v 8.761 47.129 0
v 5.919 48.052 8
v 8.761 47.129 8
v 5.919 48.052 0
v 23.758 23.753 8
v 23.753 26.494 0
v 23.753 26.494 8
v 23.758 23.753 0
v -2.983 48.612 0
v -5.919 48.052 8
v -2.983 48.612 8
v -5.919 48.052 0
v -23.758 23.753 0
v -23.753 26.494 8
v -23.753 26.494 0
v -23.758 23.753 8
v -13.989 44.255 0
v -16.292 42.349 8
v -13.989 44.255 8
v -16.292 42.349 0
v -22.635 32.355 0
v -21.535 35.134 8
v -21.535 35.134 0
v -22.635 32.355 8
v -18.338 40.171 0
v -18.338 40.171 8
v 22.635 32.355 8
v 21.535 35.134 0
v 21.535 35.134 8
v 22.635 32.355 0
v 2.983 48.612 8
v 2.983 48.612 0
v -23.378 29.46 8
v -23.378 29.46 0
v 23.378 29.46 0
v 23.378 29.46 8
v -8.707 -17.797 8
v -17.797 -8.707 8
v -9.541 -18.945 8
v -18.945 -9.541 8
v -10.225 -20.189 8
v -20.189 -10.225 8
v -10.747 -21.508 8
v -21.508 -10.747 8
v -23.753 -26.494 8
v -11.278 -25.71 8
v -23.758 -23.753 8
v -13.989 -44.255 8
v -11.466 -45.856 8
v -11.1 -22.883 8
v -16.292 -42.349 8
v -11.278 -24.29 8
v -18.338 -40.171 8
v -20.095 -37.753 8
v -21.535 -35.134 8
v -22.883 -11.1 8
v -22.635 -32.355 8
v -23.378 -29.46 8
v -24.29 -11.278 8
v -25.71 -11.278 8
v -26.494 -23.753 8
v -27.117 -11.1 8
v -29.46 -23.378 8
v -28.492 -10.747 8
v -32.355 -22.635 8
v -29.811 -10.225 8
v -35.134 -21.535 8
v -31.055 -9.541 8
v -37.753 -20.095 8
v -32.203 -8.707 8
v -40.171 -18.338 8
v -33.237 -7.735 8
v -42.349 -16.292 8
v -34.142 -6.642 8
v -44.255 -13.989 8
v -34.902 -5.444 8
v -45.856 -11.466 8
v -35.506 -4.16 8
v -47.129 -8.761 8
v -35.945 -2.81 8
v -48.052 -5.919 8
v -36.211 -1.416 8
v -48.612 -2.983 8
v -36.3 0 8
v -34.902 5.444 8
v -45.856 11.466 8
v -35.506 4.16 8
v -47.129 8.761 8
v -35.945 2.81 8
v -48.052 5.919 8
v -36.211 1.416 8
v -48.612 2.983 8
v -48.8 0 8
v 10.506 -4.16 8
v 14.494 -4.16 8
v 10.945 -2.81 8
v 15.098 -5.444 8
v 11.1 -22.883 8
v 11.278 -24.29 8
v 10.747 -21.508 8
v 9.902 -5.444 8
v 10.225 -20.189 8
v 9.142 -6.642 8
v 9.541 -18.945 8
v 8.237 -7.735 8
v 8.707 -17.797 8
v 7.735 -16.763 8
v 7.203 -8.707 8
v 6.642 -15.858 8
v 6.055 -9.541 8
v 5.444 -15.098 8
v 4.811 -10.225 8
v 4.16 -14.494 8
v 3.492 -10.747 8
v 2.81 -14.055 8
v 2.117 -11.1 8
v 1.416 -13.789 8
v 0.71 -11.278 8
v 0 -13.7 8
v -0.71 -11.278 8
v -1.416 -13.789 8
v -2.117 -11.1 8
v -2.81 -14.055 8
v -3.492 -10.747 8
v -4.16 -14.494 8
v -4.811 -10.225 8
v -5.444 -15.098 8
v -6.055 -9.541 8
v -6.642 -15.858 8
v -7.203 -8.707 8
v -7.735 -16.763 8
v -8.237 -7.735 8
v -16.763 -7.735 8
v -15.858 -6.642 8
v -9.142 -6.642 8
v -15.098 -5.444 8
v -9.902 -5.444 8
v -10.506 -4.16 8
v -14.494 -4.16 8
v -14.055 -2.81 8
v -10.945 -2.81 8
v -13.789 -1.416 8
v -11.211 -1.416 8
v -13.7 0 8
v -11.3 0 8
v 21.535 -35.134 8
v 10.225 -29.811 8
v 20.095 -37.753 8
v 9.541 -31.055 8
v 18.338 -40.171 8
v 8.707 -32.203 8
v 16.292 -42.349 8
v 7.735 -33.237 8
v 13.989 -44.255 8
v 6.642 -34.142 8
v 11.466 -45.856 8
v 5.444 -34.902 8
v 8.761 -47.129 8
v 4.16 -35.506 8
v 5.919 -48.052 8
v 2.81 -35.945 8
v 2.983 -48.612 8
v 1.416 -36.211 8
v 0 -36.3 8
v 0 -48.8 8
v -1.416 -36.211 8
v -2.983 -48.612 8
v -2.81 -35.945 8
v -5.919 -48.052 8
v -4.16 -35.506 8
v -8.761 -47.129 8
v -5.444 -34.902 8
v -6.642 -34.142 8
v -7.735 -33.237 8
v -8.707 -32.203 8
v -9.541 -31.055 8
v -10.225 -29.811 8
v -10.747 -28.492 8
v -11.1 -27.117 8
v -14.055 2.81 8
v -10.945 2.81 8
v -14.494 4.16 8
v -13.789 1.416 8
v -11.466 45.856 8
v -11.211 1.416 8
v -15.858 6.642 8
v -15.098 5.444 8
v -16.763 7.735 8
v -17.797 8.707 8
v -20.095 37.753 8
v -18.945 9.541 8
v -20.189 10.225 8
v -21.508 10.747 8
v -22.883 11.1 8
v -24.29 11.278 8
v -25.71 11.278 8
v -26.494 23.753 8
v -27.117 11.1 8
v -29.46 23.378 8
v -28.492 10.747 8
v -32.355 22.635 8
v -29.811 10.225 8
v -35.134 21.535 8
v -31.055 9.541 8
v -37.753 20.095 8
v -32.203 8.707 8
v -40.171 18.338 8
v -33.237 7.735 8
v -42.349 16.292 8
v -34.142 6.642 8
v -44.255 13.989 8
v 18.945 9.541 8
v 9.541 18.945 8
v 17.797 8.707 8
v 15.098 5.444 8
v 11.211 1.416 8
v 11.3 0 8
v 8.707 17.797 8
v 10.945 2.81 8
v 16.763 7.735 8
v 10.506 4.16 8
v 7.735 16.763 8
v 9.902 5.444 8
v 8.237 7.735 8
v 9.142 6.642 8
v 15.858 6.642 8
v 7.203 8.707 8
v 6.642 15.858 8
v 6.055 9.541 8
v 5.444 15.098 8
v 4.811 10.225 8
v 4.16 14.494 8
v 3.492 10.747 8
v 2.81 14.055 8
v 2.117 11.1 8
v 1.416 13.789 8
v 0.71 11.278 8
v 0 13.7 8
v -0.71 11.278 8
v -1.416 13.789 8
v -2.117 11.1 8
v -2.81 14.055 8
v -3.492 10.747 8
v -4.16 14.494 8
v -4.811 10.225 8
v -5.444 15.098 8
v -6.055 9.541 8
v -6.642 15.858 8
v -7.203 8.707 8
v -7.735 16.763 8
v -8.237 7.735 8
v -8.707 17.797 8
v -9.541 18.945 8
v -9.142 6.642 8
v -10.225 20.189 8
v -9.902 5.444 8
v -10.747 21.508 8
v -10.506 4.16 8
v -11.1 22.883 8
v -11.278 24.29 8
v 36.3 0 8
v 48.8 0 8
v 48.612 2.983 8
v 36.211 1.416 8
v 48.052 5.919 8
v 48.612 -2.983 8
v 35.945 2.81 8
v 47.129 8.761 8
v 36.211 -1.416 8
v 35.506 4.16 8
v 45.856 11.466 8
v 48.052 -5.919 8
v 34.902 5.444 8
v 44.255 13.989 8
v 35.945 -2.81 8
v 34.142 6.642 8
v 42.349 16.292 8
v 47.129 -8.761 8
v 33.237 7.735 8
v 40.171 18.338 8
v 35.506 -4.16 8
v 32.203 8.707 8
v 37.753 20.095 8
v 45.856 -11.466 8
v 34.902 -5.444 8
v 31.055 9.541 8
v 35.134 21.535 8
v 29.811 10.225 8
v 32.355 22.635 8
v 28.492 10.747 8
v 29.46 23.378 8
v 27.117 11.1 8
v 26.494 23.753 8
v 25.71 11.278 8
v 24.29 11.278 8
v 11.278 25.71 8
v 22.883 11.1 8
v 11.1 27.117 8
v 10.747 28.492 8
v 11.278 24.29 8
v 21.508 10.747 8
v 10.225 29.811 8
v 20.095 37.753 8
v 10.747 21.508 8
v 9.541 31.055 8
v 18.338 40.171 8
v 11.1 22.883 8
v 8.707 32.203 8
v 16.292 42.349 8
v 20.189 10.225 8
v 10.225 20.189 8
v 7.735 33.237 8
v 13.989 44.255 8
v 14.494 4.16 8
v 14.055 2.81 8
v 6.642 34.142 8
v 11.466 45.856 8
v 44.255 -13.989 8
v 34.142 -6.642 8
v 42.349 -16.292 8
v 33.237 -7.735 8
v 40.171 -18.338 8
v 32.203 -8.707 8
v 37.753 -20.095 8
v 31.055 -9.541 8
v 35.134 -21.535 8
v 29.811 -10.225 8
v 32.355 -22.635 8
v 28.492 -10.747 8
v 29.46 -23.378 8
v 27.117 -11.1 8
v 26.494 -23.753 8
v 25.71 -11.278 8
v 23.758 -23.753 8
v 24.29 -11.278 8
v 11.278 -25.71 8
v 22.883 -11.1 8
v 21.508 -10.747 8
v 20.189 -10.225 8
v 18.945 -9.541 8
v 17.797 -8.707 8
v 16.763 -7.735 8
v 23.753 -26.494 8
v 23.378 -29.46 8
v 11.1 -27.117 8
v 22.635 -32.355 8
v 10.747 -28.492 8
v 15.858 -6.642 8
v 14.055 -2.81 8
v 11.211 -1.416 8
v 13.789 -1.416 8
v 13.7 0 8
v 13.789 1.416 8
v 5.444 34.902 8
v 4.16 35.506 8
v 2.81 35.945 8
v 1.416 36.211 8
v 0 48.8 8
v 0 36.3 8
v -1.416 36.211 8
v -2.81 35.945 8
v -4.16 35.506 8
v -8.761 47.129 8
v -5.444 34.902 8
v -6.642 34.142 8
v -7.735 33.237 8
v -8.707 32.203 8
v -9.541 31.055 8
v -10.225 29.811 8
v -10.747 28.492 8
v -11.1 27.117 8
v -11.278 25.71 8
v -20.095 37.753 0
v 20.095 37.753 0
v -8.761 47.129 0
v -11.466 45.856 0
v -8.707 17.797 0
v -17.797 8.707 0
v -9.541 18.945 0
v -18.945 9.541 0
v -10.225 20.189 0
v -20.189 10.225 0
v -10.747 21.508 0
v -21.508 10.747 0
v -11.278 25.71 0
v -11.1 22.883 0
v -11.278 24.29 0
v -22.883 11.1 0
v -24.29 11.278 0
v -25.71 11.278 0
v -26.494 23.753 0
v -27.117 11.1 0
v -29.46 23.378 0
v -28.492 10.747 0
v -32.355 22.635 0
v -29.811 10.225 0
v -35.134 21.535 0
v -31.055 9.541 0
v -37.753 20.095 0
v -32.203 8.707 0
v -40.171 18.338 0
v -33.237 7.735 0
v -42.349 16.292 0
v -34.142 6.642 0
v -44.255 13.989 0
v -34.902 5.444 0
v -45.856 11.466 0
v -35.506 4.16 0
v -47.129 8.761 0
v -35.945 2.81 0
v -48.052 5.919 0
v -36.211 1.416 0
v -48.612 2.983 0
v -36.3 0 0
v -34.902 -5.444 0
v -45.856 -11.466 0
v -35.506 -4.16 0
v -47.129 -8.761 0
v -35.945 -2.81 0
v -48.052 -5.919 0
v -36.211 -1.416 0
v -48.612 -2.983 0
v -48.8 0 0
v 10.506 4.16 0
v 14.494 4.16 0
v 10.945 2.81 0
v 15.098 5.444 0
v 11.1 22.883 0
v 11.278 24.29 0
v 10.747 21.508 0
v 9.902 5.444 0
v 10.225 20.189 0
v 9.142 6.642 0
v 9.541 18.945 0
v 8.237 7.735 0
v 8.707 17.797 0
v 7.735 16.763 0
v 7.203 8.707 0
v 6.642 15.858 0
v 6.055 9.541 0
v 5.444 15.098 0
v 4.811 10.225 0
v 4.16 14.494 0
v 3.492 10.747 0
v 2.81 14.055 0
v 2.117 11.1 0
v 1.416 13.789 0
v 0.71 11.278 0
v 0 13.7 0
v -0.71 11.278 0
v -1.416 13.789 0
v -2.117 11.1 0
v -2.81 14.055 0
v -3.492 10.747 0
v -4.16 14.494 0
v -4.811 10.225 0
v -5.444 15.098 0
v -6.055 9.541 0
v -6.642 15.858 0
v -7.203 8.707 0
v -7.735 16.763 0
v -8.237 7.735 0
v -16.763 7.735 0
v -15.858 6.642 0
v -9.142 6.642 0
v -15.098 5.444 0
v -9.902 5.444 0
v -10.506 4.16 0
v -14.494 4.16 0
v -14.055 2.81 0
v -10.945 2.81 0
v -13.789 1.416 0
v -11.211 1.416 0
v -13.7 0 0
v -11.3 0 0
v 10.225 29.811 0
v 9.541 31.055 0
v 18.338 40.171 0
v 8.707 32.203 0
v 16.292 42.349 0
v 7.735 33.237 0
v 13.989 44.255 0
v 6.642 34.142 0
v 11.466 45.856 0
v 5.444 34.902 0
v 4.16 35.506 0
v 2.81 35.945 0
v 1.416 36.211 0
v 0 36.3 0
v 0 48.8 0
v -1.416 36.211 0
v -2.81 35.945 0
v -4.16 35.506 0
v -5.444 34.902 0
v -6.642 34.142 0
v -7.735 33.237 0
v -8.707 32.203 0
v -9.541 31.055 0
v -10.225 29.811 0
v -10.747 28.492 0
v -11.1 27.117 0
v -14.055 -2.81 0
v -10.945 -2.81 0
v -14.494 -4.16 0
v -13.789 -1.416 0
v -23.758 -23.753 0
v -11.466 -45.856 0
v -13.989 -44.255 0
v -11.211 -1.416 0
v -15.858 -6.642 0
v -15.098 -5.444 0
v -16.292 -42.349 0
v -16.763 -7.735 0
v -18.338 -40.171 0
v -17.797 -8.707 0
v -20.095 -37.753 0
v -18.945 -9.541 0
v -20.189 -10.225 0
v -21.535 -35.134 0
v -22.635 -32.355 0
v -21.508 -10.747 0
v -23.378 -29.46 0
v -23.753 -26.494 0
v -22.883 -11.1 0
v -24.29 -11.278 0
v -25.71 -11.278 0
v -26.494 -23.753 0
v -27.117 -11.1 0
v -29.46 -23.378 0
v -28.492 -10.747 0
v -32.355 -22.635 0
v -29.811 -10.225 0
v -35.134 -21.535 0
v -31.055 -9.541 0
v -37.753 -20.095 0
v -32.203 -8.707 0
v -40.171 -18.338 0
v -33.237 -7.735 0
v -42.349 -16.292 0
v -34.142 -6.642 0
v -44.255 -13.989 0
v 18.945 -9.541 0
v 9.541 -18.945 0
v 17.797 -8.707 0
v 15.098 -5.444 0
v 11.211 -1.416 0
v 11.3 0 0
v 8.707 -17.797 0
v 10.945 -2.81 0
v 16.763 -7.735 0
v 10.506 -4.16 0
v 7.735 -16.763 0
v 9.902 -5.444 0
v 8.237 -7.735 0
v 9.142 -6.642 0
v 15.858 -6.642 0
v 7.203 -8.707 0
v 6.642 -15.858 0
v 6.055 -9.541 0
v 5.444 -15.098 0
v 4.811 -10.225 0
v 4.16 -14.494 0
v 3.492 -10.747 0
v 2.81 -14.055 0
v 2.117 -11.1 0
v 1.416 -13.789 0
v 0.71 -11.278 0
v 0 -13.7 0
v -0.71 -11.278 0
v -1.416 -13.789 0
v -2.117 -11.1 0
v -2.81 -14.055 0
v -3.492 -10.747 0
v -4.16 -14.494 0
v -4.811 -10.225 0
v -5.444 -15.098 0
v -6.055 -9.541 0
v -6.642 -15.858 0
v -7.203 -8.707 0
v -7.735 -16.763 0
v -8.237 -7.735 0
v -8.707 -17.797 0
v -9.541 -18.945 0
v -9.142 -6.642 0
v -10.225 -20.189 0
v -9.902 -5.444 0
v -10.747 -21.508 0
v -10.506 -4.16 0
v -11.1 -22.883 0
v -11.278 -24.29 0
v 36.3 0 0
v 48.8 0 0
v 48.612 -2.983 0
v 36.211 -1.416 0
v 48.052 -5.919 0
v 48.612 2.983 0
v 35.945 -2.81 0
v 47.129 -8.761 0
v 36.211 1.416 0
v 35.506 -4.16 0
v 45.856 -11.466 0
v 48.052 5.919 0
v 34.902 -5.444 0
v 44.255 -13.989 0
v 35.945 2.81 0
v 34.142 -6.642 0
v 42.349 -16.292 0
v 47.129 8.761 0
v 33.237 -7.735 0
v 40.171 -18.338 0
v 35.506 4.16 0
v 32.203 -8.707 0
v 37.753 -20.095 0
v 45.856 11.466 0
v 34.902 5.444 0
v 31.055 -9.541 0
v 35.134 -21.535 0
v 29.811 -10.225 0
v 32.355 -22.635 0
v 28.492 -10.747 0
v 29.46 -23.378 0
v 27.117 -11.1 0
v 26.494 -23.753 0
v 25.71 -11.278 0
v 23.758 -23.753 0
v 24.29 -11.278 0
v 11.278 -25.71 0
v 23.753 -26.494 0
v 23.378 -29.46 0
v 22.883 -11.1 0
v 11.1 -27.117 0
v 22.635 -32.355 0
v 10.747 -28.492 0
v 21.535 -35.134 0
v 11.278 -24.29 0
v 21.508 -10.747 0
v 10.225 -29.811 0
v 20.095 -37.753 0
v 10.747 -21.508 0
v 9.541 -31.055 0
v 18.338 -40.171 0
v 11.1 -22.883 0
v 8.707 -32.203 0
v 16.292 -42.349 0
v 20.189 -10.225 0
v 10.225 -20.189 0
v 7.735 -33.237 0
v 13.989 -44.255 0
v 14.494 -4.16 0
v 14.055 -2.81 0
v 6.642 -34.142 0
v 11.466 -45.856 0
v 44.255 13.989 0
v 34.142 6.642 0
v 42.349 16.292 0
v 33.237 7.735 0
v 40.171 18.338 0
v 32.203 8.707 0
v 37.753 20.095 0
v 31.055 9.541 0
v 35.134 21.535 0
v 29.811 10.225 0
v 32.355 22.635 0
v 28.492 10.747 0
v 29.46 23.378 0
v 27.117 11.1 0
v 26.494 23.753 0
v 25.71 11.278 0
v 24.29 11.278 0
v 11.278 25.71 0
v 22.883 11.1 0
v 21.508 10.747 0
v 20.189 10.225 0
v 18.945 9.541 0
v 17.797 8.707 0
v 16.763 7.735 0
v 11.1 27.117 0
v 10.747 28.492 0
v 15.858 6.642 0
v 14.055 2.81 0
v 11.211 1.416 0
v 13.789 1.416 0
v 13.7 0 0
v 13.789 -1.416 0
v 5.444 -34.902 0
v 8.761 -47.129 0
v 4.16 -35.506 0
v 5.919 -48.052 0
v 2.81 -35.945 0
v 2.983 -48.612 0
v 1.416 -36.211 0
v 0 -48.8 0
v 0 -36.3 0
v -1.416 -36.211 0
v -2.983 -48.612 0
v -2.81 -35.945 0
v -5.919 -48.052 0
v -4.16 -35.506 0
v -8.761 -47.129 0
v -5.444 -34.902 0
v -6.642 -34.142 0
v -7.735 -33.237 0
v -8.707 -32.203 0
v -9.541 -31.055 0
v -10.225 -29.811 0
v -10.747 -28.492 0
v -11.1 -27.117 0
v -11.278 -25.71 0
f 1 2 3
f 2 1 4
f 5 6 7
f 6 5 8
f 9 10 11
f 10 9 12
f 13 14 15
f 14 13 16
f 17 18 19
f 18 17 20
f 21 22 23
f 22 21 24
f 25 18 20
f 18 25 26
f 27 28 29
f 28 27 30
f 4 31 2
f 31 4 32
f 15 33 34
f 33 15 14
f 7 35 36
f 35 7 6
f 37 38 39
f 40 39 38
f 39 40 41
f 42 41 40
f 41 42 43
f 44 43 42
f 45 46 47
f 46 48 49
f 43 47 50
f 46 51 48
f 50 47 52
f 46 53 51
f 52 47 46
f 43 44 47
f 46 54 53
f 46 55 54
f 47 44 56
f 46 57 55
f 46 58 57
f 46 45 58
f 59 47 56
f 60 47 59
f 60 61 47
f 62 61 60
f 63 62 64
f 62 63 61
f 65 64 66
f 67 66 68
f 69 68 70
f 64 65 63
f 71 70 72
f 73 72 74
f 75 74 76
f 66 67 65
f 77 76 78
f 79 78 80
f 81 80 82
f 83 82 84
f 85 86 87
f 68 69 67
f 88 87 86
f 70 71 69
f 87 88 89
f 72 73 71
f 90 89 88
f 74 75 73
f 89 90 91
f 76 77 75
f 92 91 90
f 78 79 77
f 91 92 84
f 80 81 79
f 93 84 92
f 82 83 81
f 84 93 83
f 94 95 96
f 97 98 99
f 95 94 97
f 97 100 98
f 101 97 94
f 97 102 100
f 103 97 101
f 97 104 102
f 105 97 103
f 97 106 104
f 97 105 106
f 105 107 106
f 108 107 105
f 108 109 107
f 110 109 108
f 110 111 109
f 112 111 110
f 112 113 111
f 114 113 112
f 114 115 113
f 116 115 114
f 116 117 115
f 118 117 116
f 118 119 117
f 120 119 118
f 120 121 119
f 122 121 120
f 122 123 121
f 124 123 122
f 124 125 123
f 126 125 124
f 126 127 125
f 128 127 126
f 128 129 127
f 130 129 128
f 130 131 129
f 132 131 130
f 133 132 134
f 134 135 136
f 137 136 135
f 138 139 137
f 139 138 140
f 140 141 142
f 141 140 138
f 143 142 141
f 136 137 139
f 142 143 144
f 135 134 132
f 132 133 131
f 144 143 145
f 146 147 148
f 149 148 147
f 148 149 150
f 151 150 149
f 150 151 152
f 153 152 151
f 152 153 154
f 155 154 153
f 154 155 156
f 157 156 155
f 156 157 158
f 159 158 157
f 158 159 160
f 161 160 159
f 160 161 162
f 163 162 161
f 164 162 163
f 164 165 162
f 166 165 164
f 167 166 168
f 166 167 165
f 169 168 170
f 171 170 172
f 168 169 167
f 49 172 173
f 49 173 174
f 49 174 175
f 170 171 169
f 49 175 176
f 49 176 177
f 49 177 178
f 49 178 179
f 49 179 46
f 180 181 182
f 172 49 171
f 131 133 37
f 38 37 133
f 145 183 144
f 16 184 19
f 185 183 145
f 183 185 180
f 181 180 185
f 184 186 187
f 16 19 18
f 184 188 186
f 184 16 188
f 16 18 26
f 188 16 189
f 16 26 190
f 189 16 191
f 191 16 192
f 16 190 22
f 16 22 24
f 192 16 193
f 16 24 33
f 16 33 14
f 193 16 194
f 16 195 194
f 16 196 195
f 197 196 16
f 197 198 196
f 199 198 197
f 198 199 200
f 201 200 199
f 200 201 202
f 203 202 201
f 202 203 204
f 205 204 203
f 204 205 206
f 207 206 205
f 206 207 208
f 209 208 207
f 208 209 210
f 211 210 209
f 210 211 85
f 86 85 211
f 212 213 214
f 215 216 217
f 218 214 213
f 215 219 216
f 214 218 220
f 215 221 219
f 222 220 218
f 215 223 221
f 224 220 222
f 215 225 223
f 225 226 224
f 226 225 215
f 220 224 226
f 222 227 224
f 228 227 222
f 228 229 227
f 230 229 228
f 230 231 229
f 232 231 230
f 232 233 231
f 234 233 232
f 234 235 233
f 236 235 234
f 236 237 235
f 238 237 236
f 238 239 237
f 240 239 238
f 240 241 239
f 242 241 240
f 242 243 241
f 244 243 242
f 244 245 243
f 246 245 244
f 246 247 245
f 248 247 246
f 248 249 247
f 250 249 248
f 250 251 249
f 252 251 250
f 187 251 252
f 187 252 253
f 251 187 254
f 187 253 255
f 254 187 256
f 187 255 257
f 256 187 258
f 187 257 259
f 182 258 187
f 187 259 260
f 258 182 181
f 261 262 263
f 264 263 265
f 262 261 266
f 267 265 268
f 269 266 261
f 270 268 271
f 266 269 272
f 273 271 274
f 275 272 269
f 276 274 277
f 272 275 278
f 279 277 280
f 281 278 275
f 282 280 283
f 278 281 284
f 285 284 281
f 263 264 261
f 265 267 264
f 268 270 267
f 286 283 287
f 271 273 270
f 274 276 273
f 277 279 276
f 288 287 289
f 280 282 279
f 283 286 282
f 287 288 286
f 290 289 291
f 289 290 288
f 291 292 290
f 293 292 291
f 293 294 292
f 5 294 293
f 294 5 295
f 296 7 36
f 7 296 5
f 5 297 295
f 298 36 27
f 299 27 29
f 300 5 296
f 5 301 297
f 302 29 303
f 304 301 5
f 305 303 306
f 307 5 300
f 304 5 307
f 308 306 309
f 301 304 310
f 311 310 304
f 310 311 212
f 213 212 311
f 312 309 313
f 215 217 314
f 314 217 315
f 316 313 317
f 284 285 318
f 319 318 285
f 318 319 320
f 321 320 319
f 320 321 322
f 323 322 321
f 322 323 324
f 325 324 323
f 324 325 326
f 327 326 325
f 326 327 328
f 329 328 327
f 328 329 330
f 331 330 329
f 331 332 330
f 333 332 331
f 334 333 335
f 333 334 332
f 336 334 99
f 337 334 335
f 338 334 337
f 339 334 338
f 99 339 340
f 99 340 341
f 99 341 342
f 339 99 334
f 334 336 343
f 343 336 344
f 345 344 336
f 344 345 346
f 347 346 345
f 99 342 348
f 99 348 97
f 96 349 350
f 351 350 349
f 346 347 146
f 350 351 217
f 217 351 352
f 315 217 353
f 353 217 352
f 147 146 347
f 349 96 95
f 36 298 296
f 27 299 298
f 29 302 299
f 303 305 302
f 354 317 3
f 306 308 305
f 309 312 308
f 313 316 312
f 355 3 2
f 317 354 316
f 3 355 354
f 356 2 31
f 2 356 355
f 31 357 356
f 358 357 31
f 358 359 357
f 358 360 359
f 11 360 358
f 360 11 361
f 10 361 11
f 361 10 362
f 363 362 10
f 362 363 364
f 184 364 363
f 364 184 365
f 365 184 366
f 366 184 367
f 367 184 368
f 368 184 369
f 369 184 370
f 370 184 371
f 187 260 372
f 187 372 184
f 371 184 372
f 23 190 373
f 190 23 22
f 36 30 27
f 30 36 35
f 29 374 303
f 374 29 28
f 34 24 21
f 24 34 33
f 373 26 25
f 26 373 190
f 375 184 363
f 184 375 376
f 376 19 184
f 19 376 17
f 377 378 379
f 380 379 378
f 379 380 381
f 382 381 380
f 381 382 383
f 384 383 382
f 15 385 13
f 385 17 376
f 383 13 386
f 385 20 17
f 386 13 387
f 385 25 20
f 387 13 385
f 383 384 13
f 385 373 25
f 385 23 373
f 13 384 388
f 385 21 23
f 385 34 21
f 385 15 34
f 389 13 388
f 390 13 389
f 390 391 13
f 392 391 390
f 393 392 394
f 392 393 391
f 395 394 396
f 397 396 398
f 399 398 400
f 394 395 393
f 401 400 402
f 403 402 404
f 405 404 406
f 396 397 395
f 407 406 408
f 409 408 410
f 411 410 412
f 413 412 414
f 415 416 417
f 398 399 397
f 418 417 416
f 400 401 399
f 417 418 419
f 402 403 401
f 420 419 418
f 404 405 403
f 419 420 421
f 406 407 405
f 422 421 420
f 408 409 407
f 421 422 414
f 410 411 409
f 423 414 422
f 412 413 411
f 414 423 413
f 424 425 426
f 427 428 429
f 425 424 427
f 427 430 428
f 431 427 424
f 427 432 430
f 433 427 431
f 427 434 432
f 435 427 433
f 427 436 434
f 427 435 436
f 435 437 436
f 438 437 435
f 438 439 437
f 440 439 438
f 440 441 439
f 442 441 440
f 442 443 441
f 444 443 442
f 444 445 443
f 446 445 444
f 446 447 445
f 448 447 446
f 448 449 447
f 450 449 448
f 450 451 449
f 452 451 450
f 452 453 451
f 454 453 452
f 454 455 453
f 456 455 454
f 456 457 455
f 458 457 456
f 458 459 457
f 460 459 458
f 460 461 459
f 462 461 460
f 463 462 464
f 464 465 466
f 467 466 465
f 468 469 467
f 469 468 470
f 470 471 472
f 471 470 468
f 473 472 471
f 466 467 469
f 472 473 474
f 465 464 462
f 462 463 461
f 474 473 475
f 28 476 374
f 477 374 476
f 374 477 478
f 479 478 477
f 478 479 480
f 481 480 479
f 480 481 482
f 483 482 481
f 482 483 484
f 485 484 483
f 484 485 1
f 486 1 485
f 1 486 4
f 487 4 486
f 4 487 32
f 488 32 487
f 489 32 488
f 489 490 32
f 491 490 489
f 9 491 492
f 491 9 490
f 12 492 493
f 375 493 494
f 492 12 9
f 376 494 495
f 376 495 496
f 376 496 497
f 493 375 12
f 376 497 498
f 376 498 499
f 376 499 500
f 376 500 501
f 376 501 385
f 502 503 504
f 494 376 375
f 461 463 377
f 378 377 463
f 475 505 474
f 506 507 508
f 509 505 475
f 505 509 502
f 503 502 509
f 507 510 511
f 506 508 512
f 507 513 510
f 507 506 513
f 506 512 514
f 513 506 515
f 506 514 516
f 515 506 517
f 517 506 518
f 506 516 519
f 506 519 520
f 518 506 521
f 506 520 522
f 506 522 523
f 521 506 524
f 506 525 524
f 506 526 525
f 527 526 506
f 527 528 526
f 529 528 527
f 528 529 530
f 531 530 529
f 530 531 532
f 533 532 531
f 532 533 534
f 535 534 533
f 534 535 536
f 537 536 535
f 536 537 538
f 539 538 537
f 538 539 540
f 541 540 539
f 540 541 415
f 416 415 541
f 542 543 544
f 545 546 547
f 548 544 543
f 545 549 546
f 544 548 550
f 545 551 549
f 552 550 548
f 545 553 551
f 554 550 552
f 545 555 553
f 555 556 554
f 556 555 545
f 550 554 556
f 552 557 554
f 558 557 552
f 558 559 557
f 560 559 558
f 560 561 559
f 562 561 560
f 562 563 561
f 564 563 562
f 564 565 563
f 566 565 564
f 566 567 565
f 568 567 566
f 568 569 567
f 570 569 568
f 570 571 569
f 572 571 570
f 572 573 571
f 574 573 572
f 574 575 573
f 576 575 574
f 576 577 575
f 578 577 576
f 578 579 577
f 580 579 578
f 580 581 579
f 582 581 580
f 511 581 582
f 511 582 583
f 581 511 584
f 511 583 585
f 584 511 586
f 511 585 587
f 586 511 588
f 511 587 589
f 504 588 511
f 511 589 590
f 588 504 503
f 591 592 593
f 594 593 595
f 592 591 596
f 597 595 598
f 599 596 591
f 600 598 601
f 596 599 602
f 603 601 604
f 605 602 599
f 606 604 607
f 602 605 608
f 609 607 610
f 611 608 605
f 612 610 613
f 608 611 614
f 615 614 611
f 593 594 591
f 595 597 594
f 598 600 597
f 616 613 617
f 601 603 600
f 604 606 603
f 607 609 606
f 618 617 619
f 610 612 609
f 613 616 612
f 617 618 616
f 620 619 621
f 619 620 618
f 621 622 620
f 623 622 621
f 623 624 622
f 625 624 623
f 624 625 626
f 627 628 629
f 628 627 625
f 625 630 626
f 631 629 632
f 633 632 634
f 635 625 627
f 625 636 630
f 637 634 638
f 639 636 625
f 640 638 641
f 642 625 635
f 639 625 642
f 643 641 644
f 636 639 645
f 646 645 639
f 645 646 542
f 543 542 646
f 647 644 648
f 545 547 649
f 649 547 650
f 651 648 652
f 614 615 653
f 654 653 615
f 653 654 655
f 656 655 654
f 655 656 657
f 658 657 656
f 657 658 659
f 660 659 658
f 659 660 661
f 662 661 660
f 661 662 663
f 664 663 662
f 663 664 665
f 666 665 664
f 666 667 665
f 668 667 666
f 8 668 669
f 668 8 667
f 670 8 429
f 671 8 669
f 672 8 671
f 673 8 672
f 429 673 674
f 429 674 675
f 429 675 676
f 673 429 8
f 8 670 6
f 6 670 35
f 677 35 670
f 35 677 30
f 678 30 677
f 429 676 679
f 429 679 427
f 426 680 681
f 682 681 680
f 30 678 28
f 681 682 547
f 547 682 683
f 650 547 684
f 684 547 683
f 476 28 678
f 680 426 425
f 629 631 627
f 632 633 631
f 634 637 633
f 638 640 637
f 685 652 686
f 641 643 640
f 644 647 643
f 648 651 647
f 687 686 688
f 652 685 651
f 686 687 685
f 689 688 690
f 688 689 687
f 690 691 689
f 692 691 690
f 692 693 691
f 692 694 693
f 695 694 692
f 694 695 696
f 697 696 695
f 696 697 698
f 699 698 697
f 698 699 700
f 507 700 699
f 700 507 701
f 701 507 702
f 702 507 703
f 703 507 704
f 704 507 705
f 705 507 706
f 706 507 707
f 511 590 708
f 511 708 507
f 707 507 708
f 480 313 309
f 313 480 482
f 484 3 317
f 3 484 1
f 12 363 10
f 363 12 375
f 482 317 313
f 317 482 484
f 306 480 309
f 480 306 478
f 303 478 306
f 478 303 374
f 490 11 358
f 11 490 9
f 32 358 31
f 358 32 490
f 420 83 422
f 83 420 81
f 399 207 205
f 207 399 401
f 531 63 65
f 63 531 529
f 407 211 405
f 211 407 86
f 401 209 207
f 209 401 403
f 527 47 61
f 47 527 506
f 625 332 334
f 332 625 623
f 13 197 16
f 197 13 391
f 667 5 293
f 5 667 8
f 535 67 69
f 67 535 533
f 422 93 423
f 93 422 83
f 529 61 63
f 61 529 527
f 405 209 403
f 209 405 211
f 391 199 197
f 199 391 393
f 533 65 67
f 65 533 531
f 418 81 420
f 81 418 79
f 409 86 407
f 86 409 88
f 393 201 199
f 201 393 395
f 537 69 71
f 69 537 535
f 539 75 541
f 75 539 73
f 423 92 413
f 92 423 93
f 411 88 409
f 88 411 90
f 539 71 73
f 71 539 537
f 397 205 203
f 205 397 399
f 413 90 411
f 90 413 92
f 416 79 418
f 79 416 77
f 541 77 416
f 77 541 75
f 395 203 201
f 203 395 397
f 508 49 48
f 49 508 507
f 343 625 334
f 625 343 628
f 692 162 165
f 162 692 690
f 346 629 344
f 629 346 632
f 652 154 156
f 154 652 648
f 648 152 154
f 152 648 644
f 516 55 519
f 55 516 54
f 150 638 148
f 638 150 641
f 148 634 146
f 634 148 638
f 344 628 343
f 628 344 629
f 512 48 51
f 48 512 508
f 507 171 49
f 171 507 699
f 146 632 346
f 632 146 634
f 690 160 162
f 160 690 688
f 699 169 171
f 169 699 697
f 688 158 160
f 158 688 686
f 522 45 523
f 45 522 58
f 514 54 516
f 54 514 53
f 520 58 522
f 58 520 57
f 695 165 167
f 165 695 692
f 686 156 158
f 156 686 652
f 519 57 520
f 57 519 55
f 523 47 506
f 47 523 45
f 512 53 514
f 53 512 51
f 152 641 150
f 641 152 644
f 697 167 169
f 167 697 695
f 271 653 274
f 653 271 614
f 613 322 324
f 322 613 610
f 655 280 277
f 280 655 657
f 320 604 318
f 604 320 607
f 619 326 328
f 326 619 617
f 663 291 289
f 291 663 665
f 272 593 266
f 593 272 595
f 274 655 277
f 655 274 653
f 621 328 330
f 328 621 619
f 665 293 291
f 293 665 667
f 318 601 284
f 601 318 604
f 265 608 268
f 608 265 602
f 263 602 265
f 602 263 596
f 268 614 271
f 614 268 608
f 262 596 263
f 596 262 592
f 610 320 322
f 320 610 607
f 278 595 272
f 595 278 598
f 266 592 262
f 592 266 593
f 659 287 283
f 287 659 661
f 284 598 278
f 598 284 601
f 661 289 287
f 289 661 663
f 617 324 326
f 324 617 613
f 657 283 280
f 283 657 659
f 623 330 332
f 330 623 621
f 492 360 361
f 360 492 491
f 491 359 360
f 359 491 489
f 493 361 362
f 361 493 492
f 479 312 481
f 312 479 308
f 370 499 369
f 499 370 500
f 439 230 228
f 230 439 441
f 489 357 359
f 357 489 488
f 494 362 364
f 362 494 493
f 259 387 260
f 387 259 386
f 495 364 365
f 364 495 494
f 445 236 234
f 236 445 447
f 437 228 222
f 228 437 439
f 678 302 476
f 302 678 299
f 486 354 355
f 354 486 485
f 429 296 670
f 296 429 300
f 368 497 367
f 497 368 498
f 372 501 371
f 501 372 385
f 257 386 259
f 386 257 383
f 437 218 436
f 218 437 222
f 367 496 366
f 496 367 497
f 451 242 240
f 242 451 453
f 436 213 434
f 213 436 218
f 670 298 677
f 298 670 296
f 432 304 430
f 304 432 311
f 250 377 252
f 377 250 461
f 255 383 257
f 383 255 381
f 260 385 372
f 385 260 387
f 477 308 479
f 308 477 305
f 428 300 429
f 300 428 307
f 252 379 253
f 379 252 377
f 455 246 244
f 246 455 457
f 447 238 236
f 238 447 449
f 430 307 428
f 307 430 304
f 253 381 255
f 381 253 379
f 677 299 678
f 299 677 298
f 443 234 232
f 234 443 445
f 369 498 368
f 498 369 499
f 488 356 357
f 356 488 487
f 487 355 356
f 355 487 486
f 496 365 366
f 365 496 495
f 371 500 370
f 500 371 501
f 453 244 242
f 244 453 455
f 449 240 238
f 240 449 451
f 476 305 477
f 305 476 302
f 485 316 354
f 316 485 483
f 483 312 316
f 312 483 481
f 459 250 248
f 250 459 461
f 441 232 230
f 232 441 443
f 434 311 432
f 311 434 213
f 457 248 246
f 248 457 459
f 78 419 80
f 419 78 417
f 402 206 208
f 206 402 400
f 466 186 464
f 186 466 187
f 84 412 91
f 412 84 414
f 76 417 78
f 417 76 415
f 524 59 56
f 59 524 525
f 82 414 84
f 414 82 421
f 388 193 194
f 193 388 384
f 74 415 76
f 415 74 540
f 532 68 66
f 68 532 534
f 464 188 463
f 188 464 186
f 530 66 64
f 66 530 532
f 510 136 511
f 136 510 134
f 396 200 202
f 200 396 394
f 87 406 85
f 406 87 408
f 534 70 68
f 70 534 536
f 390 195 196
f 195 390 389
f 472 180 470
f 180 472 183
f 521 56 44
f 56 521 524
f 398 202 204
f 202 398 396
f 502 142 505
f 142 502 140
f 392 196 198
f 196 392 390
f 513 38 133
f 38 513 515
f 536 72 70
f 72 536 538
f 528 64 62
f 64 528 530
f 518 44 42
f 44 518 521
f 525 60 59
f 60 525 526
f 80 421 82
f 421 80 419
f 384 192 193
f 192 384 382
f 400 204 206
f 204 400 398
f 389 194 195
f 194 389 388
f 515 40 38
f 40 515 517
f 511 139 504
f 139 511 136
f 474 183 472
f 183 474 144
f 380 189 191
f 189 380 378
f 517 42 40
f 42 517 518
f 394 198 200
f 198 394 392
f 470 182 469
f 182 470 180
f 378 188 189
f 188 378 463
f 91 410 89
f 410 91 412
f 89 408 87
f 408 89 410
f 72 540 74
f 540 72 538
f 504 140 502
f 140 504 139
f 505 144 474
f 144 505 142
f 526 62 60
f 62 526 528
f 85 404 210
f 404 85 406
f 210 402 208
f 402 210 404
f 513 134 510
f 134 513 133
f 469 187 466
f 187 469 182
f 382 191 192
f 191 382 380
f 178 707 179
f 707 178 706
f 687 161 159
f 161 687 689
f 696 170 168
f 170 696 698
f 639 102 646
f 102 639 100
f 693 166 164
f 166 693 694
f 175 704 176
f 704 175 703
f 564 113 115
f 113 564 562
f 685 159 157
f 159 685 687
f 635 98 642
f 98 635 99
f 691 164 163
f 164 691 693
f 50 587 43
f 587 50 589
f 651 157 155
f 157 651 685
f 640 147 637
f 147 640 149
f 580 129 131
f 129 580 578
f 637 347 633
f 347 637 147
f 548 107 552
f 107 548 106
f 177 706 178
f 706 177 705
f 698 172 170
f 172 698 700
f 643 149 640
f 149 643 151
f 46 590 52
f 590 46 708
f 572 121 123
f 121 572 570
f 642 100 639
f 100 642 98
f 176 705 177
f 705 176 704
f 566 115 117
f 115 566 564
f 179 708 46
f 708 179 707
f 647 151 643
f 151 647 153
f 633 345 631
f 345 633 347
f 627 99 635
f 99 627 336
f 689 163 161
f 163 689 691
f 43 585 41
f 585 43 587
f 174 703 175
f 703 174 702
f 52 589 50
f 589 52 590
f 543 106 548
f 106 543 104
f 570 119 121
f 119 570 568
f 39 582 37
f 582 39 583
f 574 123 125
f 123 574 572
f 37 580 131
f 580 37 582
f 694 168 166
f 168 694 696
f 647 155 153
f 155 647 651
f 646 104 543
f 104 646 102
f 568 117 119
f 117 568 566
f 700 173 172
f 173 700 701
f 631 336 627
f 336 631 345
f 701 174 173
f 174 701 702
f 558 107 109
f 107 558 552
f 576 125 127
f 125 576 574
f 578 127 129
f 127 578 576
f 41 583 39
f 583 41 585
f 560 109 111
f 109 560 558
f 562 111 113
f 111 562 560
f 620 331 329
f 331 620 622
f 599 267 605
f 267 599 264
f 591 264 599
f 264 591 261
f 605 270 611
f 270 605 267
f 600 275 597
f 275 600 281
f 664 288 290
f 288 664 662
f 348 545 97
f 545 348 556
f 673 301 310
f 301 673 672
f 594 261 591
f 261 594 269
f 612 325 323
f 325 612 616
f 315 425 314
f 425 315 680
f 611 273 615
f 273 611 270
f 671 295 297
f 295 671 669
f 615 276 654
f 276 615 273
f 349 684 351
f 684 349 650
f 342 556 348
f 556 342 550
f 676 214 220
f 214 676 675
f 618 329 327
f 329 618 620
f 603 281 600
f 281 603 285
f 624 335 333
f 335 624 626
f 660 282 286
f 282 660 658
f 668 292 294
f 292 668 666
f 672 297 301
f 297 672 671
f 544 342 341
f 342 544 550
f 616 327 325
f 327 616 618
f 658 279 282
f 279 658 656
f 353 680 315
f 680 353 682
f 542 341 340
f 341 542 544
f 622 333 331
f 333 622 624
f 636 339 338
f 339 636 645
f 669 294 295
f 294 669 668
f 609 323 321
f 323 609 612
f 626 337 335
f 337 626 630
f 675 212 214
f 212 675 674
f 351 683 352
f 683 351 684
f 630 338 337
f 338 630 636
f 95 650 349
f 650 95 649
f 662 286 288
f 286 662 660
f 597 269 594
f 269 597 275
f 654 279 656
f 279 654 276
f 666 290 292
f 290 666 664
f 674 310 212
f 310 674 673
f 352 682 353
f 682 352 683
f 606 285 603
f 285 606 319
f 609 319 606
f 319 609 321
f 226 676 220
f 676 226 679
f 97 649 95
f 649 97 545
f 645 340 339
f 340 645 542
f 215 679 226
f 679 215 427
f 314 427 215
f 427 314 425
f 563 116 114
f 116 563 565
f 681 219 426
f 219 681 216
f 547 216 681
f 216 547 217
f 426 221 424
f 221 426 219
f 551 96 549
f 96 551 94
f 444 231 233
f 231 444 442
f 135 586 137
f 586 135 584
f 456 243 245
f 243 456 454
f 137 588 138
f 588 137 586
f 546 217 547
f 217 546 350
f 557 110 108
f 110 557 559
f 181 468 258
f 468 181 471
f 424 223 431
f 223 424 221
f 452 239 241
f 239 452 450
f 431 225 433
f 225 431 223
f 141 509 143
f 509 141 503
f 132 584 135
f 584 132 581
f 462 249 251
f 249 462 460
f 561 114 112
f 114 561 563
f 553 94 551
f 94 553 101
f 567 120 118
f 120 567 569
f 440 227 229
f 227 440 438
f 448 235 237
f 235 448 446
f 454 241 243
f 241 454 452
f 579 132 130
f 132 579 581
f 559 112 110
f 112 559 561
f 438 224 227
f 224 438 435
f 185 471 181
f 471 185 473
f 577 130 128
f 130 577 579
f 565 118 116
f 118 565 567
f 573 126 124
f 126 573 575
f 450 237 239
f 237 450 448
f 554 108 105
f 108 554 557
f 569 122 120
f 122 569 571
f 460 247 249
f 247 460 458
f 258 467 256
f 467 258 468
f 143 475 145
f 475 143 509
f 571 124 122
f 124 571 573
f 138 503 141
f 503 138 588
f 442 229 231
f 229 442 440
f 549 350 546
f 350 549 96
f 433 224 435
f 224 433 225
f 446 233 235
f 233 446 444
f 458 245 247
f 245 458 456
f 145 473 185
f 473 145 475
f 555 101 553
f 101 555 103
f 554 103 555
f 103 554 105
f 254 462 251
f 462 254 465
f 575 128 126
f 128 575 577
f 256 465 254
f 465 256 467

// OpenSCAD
$fn = 50;
pernas = 4; //quantidade de pernas do spinner
raio = 25;  //distancia do centro (ponto 0,0,0) até o centro do cilindro externos
espessura = 12.5; //espessura entre cilindros internos e externos
raiorolamento = 11.3; // 1/2 do diametro do rolamento 
altura = 8; //altura do objeto no eixo Z
deslocamento = 0;

//subtração dos sólidos
difference() {
    //união dos sólidos que vão ser cortados
    union() {
        //função de repetição (loop) e condição da repetição(i = [1:variavel]) repetir 1, 2, 3, 4 (...) até variavel
        for(i = [1:pernas]) {
            //função de contorno
            hull(){
                //função de rotação em graus ([x,y,z])
                rotate([0,0,(360/pernas)*i]) {
                    //função de translado ([x,y,z])
                    translate([raio,0,0]){
                        //construção dos cilindros das pontas externos
                        cylinder(altura, r = raiorolamento + espessura, true);
                    //fim da função de translado
                    }
                //fim da função de rotação
                }
                //construção do cilindro central externo
                cylinder(altura, r = raiorolamento + espessura, true);
            //fim da função de contorno
            }
        //fim da função de repetição
        }
    //fim da função união
    }
    //união dos sólidos que vão realizar o corte
    union() {
        //função de repetição (loop) e condição da repetição (i = [1:variavel]) repetir 1, 2, 3, 4 (...) até variavel
        for(i = [1:pernas]) {
            //função de rotação em graus ([x,y,z])
            rotate([0,0,((360/pernas)*i)+deslocamento]) {
                //função de translado ([x,y,z])
                translate([raio,0,0]){
                    //construção dos cilindros das pontas internos 
                    cylinder(altura + 1, r = raiorolamento, true);
                //fim da função de translado
                }
            //fim da função de rotação
            }
        //fim da função de repetição
        }
        //contrução do cilindro central interno
        cylinder(altura + 1, r = raiorolamento, true);
    //fim da função união
    }
//fim da função de subtração
}
